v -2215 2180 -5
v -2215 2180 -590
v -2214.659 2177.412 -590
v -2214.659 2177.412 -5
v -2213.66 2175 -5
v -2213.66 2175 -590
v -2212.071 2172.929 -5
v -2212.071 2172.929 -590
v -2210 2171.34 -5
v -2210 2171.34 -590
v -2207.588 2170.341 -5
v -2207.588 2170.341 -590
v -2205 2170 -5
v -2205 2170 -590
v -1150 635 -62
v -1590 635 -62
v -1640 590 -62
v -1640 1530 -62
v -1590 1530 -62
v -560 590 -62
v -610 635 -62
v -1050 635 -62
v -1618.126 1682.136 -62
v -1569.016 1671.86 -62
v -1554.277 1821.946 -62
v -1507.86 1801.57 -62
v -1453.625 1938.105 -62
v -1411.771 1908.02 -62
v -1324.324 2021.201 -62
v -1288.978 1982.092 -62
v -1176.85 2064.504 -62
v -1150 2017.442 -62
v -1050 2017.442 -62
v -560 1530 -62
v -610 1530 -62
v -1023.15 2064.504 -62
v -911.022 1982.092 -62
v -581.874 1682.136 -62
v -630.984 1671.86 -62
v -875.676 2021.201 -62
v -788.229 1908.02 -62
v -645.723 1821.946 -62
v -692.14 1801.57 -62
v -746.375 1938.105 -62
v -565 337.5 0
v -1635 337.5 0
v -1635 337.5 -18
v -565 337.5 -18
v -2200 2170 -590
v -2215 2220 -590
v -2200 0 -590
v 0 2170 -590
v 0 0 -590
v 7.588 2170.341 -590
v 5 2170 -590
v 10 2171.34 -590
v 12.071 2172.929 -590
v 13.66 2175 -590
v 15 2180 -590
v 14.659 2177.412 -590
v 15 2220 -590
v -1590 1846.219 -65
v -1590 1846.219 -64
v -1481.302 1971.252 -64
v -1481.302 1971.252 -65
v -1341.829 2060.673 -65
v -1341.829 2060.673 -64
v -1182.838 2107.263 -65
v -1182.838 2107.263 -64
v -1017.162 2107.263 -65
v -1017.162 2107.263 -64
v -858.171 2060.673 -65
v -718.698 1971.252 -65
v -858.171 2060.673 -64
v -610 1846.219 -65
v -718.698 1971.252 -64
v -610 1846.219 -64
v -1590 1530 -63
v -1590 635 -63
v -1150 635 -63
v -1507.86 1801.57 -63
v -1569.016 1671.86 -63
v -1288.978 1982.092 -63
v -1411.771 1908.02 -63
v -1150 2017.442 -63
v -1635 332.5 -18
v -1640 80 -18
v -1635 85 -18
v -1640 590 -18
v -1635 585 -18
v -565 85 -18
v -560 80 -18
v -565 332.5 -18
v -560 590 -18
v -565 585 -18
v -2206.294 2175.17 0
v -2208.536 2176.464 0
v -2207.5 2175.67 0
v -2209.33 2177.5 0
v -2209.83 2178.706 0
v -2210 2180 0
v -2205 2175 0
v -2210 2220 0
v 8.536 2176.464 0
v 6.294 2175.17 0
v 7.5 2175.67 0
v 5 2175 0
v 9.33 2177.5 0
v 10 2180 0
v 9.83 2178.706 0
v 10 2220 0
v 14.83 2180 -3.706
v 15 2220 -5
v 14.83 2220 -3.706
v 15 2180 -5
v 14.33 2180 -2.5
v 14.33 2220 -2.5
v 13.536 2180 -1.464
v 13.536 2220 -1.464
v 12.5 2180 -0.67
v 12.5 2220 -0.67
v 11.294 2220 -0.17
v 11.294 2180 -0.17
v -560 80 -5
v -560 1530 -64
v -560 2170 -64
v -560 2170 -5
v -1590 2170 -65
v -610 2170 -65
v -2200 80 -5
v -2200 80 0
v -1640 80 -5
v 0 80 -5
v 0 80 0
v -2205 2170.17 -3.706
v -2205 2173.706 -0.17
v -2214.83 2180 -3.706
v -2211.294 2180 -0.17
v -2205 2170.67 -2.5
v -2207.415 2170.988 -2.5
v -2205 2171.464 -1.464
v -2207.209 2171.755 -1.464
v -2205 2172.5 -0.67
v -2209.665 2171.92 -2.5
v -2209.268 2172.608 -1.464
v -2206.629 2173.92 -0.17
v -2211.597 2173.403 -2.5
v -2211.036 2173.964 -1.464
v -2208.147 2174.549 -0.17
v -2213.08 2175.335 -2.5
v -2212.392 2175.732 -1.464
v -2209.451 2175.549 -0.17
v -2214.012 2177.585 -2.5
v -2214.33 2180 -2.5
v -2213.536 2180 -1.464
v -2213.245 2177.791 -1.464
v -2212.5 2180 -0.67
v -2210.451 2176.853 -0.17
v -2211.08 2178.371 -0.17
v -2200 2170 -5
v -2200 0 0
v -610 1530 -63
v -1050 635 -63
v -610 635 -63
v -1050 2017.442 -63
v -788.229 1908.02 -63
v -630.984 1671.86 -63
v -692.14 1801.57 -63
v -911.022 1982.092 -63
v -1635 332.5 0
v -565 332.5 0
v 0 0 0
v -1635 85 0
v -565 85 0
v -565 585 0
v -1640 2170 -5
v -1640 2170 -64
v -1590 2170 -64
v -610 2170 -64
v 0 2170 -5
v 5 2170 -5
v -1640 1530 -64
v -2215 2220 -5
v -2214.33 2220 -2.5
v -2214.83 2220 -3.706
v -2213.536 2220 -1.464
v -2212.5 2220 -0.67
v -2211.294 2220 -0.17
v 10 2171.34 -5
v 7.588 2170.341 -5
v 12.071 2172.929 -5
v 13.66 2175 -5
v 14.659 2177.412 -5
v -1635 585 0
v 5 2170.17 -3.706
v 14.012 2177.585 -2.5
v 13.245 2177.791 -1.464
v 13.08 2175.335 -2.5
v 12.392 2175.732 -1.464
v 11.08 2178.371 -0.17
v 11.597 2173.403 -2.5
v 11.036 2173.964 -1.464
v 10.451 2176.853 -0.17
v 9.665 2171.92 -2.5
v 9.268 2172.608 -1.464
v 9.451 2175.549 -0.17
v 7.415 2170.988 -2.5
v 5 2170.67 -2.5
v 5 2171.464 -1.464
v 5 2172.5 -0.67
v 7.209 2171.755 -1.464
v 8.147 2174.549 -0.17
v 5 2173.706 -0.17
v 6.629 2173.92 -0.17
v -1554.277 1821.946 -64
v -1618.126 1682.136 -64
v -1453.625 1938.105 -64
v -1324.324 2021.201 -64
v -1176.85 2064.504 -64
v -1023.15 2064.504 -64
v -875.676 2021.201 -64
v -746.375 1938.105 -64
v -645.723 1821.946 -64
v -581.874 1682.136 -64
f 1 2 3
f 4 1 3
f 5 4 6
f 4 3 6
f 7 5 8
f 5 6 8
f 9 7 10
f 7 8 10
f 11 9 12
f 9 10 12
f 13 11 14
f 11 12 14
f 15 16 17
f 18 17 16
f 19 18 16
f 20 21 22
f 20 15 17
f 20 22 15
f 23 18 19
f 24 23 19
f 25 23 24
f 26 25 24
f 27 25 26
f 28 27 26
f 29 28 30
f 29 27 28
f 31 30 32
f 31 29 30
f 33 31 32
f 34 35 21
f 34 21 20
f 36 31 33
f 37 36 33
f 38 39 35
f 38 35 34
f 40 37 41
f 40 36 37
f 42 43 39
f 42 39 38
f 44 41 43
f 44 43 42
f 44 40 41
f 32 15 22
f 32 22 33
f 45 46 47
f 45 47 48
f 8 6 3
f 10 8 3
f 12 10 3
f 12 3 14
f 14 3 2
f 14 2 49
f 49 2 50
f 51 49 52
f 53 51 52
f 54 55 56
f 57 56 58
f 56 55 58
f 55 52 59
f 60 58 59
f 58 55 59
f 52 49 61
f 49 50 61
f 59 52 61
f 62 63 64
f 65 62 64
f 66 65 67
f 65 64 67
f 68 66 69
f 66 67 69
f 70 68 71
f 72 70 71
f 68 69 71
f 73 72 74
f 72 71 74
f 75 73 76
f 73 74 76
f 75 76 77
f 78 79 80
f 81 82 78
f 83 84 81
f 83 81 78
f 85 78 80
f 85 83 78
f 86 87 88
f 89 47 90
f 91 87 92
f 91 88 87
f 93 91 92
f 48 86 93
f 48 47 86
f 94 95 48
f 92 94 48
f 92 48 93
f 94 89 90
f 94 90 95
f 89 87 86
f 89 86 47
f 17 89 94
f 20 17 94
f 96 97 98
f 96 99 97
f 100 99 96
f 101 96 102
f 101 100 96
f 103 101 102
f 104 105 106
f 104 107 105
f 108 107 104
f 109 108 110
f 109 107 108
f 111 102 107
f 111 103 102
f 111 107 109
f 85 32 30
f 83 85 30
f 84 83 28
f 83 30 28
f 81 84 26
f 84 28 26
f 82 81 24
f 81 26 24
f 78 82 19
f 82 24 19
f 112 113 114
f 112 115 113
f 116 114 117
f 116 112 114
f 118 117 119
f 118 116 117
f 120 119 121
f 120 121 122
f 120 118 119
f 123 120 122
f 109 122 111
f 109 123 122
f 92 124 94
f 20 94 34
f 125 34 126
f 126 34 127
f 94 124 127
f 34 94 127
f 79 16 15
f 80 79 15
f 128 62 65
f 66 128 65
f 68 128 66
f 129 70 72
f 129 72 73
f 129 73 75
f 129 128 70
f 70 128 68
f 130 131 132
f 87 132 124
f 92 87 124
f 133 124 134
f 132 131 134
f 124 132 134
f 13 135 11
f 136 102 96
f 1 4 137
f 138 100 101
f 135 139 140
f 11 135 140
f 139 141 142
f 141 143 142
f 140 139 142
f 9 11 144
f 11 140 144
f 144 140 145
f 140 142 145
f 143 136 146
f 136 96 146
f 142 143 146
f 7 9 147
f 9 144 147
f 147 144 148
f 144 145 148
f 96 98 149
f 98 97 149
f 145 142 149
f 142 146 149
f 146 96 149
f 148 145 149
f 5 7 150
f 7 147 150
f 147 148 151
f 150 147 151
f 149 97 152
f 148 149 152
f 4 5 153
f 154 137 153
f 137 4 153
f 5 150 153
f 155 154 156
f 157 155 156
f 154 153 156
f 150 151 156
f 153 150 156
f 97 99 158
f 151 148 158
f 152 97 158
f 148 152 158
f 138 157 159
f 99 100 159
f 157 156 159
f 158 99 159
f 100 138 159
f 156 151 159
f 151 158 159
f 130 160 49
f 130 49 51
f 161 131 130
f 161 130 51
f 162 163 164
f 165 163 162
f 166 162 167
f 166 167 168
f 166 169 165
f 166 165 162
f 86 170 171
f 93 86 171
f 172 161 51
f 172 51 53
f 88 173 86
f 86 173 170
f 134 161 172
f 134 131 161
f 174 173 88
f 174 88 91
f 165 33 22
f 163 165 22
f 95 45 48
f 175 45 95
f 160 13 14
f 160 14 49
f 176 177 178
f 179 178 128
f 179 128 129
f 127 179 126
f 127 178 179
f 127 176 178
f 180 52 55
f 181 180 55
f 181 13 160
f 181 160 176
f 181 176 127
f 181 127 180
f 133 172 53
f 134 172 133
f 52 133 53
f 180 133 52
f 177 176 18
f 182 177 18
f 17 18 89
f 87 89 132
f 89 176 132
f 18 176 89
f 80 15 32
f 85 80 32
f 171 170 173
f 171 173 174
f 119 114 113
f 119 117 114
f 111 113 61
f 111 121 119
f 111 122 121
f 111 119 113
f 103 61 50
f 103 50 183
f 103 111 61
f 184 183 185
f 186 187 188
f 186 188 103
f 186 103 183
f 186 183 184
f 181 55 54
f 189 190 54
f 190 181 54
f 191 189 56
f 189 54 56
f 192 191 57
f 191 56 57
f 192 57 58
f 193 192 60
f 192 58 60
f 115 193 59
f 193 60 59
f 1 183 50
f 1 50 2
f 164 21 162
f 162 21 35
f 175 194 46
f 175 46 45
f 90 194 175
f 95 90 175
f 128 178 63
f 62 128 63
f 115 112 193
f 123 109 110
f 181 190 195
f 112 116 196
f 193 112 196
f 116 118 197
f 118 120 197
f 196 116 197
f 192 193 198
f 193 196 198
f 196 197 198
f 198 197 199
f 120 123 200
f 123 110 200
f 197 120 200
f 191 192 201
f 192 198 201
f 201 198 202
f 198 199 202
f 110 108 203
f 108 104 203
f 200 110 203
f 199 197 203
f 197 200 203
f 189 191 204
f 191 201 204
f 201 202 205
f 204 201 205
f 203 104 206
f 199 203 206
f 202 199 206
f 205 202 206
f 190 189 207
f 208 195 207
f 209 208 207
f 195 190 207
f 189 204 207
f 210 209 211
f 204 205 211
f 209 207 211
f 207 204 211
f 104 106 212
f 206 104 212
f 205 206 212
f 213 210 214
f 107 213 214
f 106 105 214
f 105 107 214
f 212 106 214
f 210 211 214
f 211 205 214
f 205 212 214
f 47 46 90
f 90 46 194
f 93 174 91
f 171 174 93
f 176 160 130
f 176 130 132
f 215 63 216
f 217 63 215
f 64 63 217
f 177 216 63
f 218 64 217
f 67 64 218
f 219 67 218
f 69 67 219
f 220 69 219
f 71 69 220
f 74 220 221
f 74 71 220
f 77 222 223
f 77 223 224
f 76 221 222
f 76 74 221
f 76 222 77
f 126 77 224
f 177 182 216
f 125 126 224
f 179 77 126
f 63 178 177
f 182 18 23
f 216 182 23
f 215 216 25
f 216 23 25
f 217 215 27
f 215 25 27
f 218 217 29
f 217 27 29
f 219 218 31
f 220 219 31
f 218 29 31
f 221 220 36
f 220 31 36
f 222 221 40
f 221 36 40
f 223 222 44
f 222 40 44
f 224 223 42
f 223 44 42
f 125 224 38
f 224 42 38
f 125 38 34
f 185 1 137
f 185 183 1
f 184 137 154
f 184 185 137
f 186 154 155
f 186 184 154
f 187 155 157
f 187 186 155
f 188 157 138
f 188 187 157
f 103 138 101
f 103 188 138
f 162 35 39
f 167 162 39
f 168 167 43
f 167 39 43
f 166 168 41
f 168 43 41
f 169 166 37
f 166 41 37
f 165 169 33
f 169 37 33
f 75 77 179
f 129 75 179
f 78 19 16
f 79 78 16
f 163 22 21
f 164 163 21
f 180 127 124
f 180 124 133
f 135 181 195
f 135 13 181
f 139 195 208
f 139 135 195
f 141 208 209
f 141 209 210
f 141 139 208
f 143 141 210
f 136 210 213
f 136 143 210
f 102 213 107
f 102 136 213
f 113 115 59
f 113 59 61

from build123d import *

# Parameters (mm, degrees)
F0_W     = 1070
F0_H     = 247.5
F0_W_2   = 440
F0_H_2   = 876.6265964508
F1_DEPTH = 590
F2_R     = 10
F3_DEPTH = 65
F4_DEPTH = 64
F5_DEPTH = 62
F6_DEPTH = 63
F7_DEPTH = 5
F8_R     = 4.99999
F9_DEPTH = 18


# Not quite as in the source:
# - a fillet or chamfer is up to 0.001 mm smaller than in the source, because OpenCascade refuses the exact size
# - a feature of the source that left no trace in its solid (it failed there, or was rolled back) is left out


with BuildPart() as f1:
    # F0 (on Top) → F1 (new body)
    with BuildSketch(Plane.XY):
        with BuildLine():
            Line((-1640, 1530), (-1640, 1135))
            Line((-1640, 1135), (-1640, 590))
            Line((-1640, 590), (-1100, 590))
            Line((-1100, 590), (-1100, 1511.6265964508))
            Line((-1100, 1511.6265964508), (-1100, 2020))
            Line((-1100, 2020), (-1100, 2070))
            ThreePointArc((-1100, 2070), (-1481.8376618407, 1911.8376618407), (-1640, 1530))
        make_face()
        with BuildLine():
            Line((-1150, 1530), (-1150, 1511.6265964508))
            Line((-1150, 1511.6265964508), (-1150, 635))
            Line((-1150, 635), (-1590, 635))
            Line((-1590, 635), (-1590, 1511.6265964508))
            Line((-1590, 1511.6265964508), (-1590, 1530))
            ThreePointArc((-1590, 1530), (-1463.7306695895, 1858.3291031876), (-1150, 2017.4423042782))
            Line((-1150, 2017.4423042782), (-1150, 1530))
        make_face(mode=Mode.SUBTRACT)
        with BuildLine():
            Line((-560, 590), (-560, 1135))
            Line((-560, 1135), (-560, 1530))
            ThreePointArc((-560, 1530), (-644.9475295345, 1820.7357032139), (-873.0638856418, 2020))
            Line((-873.0638856418, 2020), (-1100, 2020))
            Line((-1100, 2020), (-1100, 1511.6265964508))
            Line((-1100, 1511.6265964508), (-1100, 590))
            Line((-1100, 590), (-560, 590))
        make_face()
        with BuildLine():
            Line((-1050, 635), (-1050, 1511.6265964508))
            Line((-1050, 1511.6265964508), (-1050, 1530))
            Line((-1050, 1530), (-1050, 2017.4423042782))
            ThreePointArc((-1050, 2017.4423042782), (-736.2693304105, 1858.3291031876), (-610, 1530))
            Line((-610, 1530), (-610, 1511.6265964508))
            Line((-610, 1511.6265964508), (-610, 635))
            Line((-610, 635), (-1050, 635))
        make_face(mode=Mode.SUBTRACT)
        Polygon((-560, 80), (0, 80), (0, 1135), (-560, 1135), (-560, 590), align=None)
        Polygon((-2200, 1135), (-2200, 80), (-1640, 80), (-1640, 590), (-1640, 1135), align=None)
        Polygon((-2200, 2170), (-2200, 1135), (-1640, 1135), (-1640, 1530), (-1640, 2170), align=None)
        Polygon((-560, 1135), (0, 1135), (0, 2170), (-560, 2170), (-560, 1530), align=None)
        Polygon((-1100, 80), (-560, 80), (-560, 590), (-1100, 590), (-1640, 590), (-1640, 80), align=None)
        with Locations((-1100, 208.75)):
            Rectangle(F0_W, F0_H, mode=Mode.SUBTRACT)
        with Locations((-1100, 461.25)):
            Rectangle(F0_W, F0_H, mode=Mode.SUBTRACT)
        with Locations((-830, 1073.3132982254)):
            Rectangle(F0_W_2, F0_H_2)
        with Locations((-1370, 1073.3132982254)):
            Rectangle(F0_W_2, F0_H_2)
        with Locations((-1100, 461.25)):
            Rectangle(F0_W, F0_H)
        with Locations((-1100, 208.75)):
            Rectangle(F0_W, F0_H)
        Polygon((-2200, 0), (0, 0), (0, 80), (-560, 80), (-1100, 80), (-1640, 80), (-2200, 80), align=None)
        with BuildLine():
            Line((-1590, 1511.6265964508), (-1150, 1511.6265964508))
            Line((-1150, 1511.6265964508), (-1150, 1530))
            Line((-1150, 1530), (-1150, 2017.4423042782))
            ThreePointArc((-1150, 2017.4423042782), (-1463.7306695895, 1858.3291031876), (-1590, 1530))
            Line((-1590, 1530), (-1590, 1511.6265964508))
        make_face()
        with BuildLine():
            Line((-1050, 1530), (-1050, 1511.6265964508))
            Line((-1050, 1511.6265964508), (-610, 1511.6265964508))
            Line((-610, 1511.6265964508), (-610, 1530))
            ThreePointArc((-610, 1530), (-736.2693304105, 1858.3291031876), (-1050, 2017.4423042782))
            Line((-1050, 2017.4423042782), (-1050, 1530))
        make_face()
        Polygon((-560, 2170), (0, 2170), (15, 2170), (15, 2220), (0, 2220), (-2200, 2220), (-2215, 2220), (-2215, 2170), (-2200, 2170), (-1640, 2170), (-1590, 2170), (-1100, 2170), (-610, 2170), align=None)
        with BuildLine():
            Line((-1100, 2170), (-1590, 2170))
            Line((-1590, 2170), (-1590, 1846.2193073328))
            ThreePointArc((-1590, 1846.2193073328), (-1379.000923117, 2042.1065662827), (-1100, 2113.1763458252))
            Line((-1100, 2113.1763458252), (-1100, 2170))
        make_face()
        with BuildLine():
            Line((-610, 2020), (-610, 2170))
            Line((-610, 2170), (-1100, 2170))
            Line((-1100, 2170), (-1100, 2113.1763458252))
            ThreePointArc((-1100, 2113.1763458252), (-935.1694189847, 2089.397470402), (-783.7806926672, 2020))
            Line((-783.7806926672, 2020), (-610, 2020))
        make_face()
        with BuildLine():
            Line((-1590, 2170), (-1640, 2170))
            Line((-1640, 2170), (-1640, 1530))
            ThreePointArc((-1640, 1530), (-1481.8376618407, 1911.8376618407), (-1100, 2070))
            Line((-1100, 2070), (-1100, 2113.1763458252))
            ThreePointArc((-1100, 2113.1763458252), (-1379.000923117, 2042.1065662827), (-1590, 1846.2193073328))
            Line((-1590, 1846.2193073328), (-1590, 2170))
        make_face()
        with BuildLine():
            Line((-560, 1530), (-560, 2170))
            Line((-560, 2170), (-610, 2170))
            Line((-610, 2170), (-610, 2020))
            Line((-610, 2020), (-610, 1846.2193073328))
            ThreePointArc((-610, 1846.2193073328), (-687.6320512394, 1942.3679487606), (-783.7806926672, 2020))
            Line((-783.7806926672, 2020), (-873.0638856418, 2020))
            ThreePointArc((-873.0638856418, 2020), (-644.9475295345, 1820.7357032139), (-560, 1530))
        make_face()
        with BuildLine():
            Line((-610, 1846.2193073328), (-610, 2020))
            Line((-610, 2020), (-783.7806926672, 2020))
            ThreePointArc((-783.7806926672, 2020), (-687.6320512394, 1942.3679487606), (-610, 1846.2193073328))
        make_face()
        with BuildLine():
            ThreePointArc((-1100, 2070), (-983.8104996138, 2057.3518749374), (-873.0638856418, 2020))
            Line((-873.0638856418, 2020), (-783.7806926672, 2020))
            ThreePointArc((-783.7806926672, 2020), (-935.1694189847, 2089.397470402), (-1100, 2113.1763458252))
            Line((-1100, 2113.1763458252), (-1100, 2070))
        make_face()
        with BuildLine():
            Line((-1100, 2020), (-873.0638856418, 2020))
            ThreePointArc((-873.0638856418, 2020), (-983.8104996138, 2057.3518749374), (-1100, 2070))
            Line((-1100, 2070), (-1100, 2020))
        make_face()
    extrude(amount=-F1_DEPTH)

    # F2
    f2_edges = [f1.edges().sort_by_distance(p)[0] for p in [
        (15, 2170, -295),
        (-2215, 2170, -295),
    ]]
    fillet(f2_edges, radius=F2_R)

    # F0 (on Top) → F3 (cut)
    with BuildSketch(Plane.XY):
        with BuildLine():
            Line((-1100, 2170), (-1590, 2170))
            Line((-1590, 2170), (-1590, 1846.2193073328))
            ThreePointArc((-1590, 1846.2193073328), (-1379.000923117, 2042.1065662827), (-1100, 2113.1763458252))
            Line((-1100, 2113.1763458252), (-1100, 2170))
        make_face()
        with BuildLine():
            Line((-610, 2020), (-610, 2170))
            Line((-610, 2170), (-1100, 2170))
            Line((-1100, 2170), (-1100, 2113.1763458252))
            ThreePointArc((-1100, 2113.1763458252), (-935.1694189847, 2089.397470402), (-783.7806926672, 2020))
            Line((-783.7806926672, 2020), (-610, 2020))
        make_face()
        with BuildLine():
            Line((-610, 1846.2193073328), (-610, 2020))
            Line((-610, 2020), (-783.7806926672, 2020))
            ThreePointArc((-783.7806926672, 2020), (-687.6320512394, 1942.3679487606), (-610, 1846.2193073328))
        make_face()
    extrude(amount=-F3_DEPTH, mode=Mode.SUBTRACT)

    # F0 (on Top) → F4 (cut)
    with BuildSketch(Plane.XY):
        with BuildLine():
            Line((-1590, 2170), (-1640, 2170))
            Line((-1640, 2170), (-1640, 1530))
            ThreePointArc((-1640, 1530), (-1481.8376618407, 1911.8376618407), (-1100, 2070))
            Line((-1100, 2070), (-1100, 2113.1763458252))
            ThreePointArc((-1100, 2113.1763458252), (-1379.000923117, 2042.1065662827), (-1590, 1846.2193073328))
            Line((-1590, 1846.2193073328), (-1590, 2170))
        make_face()
        with BuildLine():
            ThreePointArc((-1100, 2070), (-983.8104996138, 2057.3518749374), (-873.0638856418, 2020))
            Line((-873.0638856418, 2020), (-783.7806926672, 2020))
            ThreePointArc((-783.7806926672, 2020), (-935.1694189847, 2089.397470402), (-1100, 2113.1763458252))
            Line((-1100, 2113.1763458252), (-1100, 2070))
        make_face()
        with BuildLine():
            Line((-560, 1530), (-560, 2170))
            Line((-560, 2170), (-610, 2170))
            Line((-610, 2170), (-610, 2020))
            Line((-610, 2020), (-610, 1846.2193073328))
            ThreePointArc((-610, 1846.2193073328), (-687.6320512394, 1942.3679487606), (-783.7806926672, 2020))
            Line((-783.7806926672, 2020), (-873.0638856418, 2020))
            ThreePointArc((-873.0638856418, 2020), (-644.9475295345, 1820.7357032139), (-560, 1530))
        make_face()
    extrude(amount=-F4_DEPTH, mode=Mode.SUBTRACT)

    # F0 (on Top) → F5 (cut)
    with BuildSketch(Plane.XY):
        with BuildLine():
            Line((-1640, 1530), (-1640, 1135))
            Line((-1640, 1135), (-1640, 590))
            Line((-1640, 590), (-1100, 590))
            Line((-1100, 590), (-1100, 1511.6265964508))
            Line((-1100, 1511.6265964508), (-1100, 2020))
            Line((-1100, 2020), (-1100, 2070))
            ThreePointArc((-1100, 2070), (-1481.8376618407, 1911.8376618407), (-1640, 1530))
        make_face()
        with BuildLine():
            Line((-1150, 1530), (-1150, 1511.6265964508))
            Line((-1150, 1511.6265964508), (-1150, 635))
            Line((-1150, 635), (-1590, 635))
            Line((-1590, 635), (-1590, 1511.6265964508))
            Line((-1590, 1511.6265964508), (-1590, 1530))
            ThreePointArc((-1590, 1530), (-1463.7306695895, 1858.3291031876), (-1150, 2017.4423042782))
            Line((-1150, 2017.4423042782), (-1150, 1530))
        make_face(mode=Mode.SUBTRACT)
        with BuildLine():
            Line((-1100, 2020), (-873.0638856418, 2020))
            ThreePointArc((-873.0638856418, 2020), (-983.8104996138, 2057.3518749374), (-1100, 2070))
            Line((-1100, 2070), (-1100, 2020))
        make_face()
        with BuildLine():
            Line((-560, 590), (-560, 1135))
            Line((-560, 1135), (-560, 1530))
            ThreePointArc((-560, 1530), (-644.9475295345, 1820.7357032139), (-873.0638856418, 2020))
            Line((-873.0638856418, 2020), (-1100, 2020))
            Line((-1100, 2020), (-1100, 1511.6265964508))
            Line((-1100, 1511.6265964508), (-1100, 590))
            Line((-1100, 590), (-560, 590))
        make_face()
        with BuildLine():
            Line((-1050, 635), (-1050, 1511.6265964508))
            Line((-1050, 1511.6265964508), (-1050, 1530))
            Line((-1050, 1530), (-1050, 2017.4423042782))
            ThreePointArc((-1050, 2017.4423042782), (-736.2693304105, 1858.3291031876), (-610, 1530))
            Line((-610, 1530), (-610, 1511.6265964508))
            Line((-610, 1511.6265964508), (-610, 635))
            Line((-610, 635), (-1050, 635))
        make_face(mode=Mode.SUBTRACT)
    extrude(amount=-F5_DEPTH, mode=Mode.SUBTRACT)

    # F0 (on Top) → F6 (cut)
    with BuildSketch(Plane.XY):
        with Locations((-1370, 1073.3132982254)):
            Rectangle(F0_W_2, F0_H_2)
        with Locations((-830, 1073.3132982254)):
            Rectangle(F0_W_2, F0_H_2)
        with BuildLine():
            Line((-1050, 1530), (-1050, 1511.6265964508))
            Line((-1050, 1511.6265964508), (-610, 1511.6265964508))
            Line((-610, 1511.6265964508), (-610, 1530))
            ThreePointArc((-610, 1530), (-736.2693304105, 1858.3291031876), (-1050, 2017.4423042782))
            Line((-1050, 2017.4423042782), (-1050, 1530))
        make_face()
        with BuildLine():
            Line((-1590, 1511.6265964508), (-1150, 1511.6265964508))
            Line((-1150, 1511.6265964508), (-1150, 1530))
            Line((-1150, 1530), (-1150, 2017.4423042782))
            ThreePointArc((-1150, 2017.4423042782), (-1463.7306695895, 1858.3291031876), (-1590, 1530))
            Line((-1590, 1530), (-1590, 1511.6265964508))
        make_face()
    extrude(amount=-F6_DEPTH, mode=Mode.SUBTRACT)

    # F0 (on Top) → F7 (cut)
    with BuildSketch(Plane.XY):
        Polygon((-2200, 2170), (-2200, 1135), (-1640, 1135), (-1640, 1530), (-1640, 2170), align=None)
        Polygon((-2200, 1135), (-2200, 80), (-1640, 80), (-1640, 590), (-1640, 1135), align=None)
        Polygon((-560, 1135), (0, 1135), (0, 2170), (-560, 2170), (-560, 1530), align=None)
        Polygon((-560, 80), (0, 80), (0, 1135), (-560, 1135), (-560, 590), align=None)
    extrude(amount=-F7_DEPTH, mode=Mode.SUBTRACT)

    # F8 (radius 5 in the source; OpenCascade refuses exactly that, so slightly less here)
    f8_edges = [f1.edges().sort_by_distance(p)[0] for p in [
        (-1100, 2170, 0),
    ]]
    fillet(f8_edges, radius=F8_R)

    # F0 (on Top) → F9 (cut)
    with BuildSketch(Plane.XY):
        Polygon((-1100, 80), (-560, 80), (-560, 590), (-1100, 590), (-1640, 590), (-1640, 80), align=None)
        with Locations((-1100, 208.75)):
            Rectangle(F0_W, F0_H, mode=Mode.SUBTRACT)
        with Locations((-1100, 461.25)):
            Rectangle(F0_W, F0_H, mode=Mode.SUBTRACT)
    extrude(amount=-F9_DEPTH, mode=Mode.SUBTRACT)


solid = f1.part
